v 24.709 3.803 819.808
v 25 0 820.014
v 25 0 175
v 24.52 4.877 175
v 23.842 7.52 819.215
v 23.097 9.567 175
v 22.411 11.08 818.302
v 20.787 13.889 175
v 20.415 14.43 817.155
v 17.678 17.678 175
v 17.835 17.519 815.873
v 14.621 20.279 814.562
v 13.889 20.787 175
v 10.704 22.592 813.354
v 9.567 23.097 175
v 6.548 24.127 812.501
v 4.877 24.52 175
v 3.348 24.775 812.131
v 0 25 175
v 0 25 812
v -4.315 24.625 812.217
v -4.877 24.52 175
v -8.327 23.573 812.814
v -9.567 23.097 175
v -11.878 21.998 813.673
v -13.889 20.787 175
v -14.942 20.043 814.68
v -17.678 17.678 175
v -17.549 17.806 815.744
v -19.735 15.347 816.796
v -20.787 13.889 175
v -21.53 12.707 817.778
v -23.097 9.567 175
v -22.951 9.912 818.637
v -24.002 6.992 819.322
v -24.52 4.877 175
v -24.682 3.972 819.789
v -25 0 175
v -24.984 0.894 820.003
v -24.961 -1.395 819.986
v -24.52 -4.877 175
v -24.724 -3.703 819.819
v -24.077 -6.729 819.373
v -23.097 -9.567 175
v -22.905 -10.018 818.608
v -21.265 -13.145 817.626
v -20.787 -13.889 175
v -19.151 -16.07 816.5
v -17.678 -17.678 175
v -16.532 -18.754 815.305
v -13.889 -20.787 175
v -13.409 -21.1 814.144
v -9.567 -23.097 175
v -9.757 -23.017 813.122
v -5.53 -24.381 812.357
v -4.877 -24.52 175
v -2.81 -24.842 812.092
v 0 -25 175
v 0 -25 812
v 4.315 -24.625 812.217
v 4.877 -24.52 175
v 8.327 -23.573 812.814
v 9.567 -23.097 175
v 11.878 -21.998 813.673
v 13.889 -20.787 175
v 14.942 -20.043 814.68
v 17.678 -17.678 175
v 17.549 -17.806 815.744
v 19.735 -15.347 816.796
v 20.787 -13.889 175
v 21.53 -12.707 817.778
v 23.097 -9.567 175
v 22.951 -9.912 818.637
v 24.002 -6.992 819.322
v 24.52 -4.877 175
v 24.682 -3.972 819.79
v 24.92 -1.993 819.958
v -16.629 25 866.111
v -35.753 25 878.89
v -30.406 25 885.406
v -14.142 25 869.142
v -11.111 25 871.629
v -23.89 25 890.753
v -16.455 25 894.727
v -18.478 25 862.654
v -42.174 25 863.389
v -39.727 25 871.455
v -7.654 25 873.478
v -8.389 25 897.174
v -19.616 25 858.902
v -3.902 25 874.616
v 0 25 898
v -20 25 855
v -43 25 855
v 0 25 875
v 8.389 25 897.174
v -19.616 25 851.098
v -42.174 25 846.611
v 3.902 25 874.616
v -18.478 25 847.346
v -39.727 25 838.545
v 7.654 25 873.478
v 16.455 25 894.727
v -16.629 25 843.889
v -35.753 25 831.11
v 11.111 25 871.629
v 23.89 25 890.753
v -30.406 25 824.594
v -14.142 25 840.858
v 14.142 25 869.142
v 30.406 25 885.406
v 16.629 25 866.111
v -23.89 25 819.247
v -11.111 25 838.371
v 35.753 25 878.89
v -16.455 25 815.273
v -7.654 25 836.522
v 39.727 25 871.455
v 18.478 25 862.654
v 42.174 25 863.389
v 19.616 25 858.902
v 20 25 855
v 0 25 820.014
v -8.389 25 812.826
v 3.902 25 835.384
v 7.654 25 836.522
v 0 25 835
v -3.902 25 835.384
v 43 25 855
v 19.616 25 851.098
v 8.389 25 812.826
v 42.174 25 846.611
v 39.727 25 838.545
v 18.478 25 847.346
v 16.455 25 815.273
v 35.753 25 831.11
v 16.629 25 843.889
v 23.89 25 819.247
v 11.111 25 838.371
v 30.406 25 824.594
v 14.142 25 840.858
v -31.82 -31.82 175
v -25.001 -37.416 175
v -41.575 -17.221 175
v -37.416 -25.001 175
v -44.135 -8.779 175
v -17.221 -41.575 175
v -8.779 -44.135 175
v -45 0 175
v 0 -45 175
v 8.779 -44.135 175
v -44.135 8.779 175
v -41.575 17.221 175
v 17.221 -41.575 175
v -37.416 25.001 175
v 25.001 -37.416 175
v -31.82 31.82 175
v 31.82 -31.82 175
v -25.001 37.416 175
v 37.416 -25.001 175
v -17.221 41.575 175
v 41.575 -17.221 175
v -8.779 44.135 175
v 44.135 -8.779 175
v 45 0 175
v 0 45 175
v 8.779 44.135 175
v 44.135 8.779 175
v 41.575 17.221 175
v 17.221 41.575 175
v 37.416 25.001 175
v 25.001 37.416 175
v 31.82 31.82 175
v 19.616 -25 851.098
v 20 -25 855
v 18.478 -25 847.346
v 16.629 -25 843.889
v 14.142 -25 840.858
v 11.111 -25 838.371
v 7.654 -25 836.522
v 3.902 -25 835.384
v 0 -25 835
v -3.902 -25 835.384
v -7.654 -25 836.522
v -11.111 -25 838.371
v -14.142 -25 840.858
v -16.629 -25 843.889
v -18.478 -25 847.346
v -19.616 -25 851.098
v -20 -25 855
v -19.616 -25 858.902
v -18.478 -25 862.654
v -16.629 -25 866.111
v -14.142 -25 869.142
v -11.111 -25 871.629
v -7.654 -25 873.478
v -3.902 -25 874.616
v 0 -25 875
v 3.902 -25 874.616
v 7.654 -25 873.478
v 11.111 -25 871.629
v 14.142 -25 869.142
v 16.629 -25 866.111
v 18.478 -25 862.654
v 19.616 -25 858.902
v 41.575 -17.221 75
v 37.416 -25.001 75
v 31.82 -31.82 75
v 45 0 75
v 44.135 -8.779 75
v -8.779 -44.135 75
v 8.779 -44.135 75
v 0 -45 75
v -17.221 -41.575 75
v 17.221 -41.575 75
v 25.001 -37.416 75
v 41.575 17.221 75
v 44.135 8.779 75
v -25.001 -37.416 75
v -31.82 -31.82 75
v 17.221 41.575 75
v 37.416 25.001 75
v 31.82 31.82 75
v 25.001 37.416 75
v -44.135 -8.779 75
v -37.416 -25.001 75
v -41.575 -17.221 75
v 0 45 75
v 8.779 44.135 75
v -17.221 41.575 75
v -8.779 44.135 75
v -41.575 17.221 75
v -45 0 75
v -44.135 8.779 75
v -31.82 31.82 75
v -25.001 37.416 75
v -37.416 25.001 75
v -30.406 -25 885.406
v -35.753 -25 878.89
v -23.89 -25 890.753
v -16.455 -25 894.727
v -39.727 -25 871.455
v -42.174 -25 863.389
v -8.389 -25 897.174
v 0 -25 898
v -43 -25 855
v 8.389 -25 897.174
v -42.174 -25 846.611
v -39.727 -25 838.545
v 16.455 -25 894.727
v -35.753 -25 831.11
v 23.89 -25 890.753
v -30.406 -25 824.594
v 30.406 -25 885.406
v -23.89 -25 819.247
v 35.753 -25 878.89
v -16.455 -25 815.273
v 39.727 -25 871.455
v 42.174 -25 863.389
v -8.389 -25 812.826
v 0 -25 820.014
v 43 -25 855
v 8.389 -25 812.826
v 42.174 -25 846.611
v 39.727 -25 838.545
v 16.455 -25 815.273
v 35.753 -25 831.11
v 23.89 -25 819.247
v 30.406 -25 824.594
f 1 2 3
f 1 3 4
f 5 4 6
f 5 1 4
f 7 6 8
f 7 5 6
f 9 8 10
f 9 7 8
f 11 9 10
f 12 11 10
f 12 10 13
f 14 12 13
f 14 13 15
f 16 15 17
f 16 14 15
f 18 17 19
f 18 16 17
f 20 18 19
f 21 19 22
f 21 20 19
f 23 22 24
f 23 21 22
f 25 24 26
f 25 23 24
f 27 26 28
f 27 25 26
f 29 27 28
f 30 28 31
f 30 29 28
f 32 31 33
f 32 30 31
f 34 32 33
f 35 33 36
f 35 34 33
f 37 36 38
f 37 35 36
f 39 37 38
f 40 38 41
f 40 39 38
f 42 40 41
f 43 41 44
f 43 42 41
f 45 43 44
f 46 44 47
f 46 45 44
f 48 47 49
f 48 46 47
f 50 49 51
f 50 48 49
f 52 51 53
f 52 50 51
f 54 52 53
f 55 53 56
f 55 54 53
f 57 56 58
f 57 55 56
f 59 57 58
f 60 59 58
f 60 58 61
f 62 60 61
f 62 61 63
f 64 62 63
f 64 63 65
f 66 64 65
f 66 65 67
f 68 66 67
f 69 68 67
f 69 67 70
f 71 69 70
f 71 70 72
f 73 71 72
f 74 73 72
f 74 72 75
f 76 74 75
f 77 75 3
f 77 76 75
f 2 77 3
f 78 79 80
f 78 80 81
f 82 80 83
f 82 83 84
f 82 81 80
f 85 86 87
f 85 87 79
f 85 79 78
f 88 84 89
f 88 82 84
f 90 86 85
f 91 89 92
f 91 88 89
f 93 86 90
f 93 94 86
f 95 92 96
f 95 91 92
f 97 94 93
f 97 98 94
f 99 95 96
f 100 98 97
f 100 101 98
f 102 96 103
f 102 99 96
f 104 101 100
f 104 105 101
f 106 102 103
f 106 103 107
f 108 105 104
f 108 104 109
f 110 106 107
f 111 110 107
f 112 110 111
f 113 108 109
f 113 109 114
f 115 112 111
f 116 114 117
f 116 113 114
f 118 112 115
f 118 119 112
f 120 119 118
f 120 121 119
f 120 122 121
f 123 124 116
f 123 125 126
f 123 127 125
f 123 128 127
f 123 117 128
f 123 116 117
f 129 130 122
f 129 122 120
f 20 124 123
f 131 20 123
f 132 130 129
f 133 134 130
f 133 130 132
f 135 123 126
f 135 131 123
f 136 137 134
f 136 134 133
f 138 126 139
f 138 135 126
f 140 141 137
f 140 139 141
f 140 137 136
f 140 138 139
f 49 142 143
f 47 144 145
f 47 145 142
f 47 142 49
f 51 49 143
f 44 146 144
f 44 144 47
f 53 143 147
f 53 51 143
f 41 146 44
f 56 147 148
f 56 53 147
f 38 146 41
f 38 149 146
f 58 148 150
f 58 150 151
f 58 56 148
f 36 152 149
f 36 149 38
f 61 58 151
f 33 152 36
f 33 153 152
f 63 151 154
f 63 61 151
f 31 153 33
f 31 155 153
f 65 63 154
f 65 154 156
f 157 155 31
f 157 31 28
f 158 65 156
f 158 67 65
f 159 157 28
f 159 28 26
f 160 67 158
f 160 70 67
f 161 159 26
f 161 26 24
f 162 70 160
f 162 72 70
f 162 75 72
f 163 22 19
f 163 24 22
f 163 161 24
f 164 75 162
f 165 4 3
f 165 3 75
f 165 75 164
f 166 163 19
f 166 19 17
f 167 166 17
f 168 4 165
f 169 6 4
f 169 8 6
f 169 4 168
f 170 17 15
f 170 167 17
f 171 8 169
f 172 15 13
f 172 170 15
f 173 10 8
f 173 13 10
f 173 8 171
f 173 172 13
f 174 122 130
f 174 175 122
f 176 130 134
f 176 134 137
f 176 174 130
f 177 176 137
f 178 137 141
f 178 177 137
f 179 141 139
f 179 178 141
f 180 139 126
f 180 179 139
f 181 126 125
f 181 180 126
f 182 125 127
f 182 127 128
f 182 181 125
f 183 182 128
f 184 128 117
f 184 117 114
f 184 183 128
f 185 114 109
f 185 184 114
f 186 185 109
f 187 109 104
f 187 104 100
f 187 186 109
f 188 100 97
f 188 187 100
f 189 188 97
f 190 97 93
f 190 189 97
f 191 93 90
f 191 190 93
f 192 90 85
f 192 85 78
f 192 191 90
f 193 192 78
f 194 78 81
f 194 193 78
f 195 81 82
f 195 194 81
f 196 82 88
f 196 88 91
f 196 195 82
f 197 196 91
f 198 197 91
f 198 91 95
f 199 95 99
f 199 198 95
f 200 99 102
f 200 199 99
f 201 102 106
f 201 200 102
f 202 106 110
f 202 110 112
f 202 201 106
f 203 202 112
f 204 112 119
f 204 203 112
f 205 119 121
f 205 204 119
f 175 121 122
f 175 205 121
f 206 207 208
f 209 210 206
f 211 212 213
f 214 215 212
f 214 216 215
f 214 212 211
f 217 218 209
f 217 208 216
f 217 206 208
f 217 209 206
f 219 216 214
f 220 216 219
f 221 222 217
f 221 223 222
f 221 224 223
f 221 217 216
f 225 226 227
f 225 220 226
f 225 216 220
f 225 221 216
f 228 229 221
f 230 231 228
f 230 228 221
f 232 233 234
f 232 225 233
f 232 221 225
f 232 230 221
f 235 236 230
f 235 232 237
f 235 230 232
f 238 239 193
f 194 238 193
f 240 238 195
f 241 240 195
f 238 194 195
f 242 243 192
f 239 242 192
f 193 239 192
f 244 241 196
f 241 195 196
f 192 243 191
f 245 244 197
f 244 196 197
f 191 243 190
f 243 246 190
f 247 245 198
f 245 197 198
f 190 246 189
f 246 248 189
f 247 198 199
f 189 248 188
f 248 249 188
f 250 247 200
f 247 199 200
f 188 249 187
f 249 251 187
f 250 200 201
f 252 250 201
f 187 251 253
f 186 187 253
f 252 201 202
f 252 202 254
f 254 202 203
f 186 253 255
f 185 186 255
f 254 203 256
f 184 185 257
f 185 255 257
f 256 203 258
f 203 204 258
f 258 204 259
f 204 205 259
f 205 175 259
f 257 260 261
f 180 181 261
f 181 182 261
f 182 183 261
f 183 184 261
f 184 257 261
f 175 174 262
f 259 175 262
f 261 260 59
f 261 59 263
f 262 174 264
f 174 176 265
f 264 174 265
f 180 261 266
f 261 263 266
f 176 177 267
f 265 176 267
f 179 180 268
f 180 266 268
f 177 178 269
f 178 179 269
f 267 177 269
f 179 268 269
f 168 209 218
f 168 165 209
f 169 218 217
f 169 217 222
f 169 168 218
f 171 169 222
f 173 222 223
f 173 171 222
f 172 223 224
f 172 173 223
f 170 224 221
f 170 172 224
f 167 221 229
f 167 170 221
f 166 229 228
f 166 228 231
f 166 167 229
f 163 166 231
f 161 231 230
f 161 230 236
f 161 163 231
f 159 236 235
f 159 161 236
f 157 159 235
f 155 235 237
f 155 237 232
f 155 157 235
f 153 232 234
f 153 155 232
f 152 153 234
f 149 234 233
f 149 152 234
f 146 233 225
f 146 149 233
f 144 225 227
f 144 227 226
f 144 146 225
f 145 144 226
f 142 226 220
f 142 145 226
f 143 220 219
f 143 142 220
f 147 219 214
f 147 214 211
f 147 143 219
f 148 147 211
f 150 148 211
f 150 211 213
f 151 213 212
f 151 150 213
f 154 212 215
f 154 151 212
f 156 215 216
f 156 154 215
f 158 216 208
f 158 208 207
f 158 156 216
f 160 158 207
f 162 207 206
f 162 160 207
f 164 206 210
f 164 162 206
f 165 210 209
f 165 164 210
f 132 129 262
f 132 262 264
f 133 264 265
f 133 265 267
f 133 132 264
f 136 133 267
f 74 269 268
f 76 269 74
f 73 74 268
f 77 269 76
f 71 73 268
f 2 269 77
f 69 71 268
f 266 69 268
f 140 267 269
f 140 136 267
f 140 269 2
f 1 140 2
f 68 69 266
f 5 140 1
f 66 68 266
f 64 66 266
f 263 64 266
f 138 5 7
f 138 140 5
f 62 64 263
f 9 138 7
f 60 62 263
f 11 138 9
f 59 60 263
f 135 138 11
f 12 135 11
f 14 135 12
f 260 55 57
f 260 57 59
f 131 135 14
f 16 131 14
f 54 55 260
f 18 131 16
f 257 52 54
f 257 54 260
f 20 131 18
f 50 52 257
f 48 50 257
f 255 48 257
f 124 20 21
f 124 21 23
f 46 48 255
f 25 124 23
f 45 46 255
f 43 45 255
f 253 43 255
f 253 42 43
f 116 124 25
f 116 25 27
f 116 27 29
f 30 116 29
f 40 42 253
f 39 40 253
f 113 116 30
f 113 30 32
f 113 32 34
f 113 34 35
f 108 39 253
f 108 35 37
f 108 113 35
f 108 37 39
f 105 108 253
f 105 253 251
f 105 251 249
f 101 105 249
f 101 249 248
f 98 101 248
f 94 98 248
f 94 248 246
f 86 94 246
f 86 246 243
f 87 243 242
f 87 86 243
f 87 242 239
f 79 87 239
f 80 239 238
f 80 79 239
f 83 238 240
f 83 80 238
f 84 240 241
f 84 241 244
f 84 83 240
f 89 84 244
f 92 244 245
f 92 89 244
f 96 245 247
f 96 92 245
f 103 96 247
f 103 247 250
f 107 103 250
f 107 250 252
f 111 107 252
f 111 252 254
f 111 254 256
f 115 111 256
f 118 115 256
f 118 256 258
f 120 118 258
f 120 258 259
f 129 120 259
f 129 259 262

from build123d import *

# Parameters (mm, degrees)
SKETCH3_R           = 43
SKETCH3_R_2         = 20
BOSS_EXTRUDE1_DEPTH = 25


with BuildPart() as part:
    # Sketch1 → Revolve1 (revolve)
    with BuildSketch(Plane(origin=(0, 0, 0), x_dir=(1, 0, 0), z_dir=(0, 1, 0))):
        Polygon((0, -75), (45, -75), (45, -175), (25, -175), (25, -820.014288631), (0, -820.014288631), align=None)
    revolve(axis=Axis((0, 0, 75), (0, 0, 1)))

    # Sketch3 → Boss-Extrude1 (add, symmetric)
    with BuildSketch(Plane(origin=(0, 0, 0), x_dir=(1, 0, 0), z_dir=(0, 1, 0))):
        with Locations((0, -855)):
            Circle(SKETCH3_R)
        with Locations((0, -855)):
            Circle(SKETCH3_R_2, mode=Mode.SUBTRACT)
    extrude(amount=BOSS_EXTRUDE1_DEPTH, both=True)


solid = part.part
